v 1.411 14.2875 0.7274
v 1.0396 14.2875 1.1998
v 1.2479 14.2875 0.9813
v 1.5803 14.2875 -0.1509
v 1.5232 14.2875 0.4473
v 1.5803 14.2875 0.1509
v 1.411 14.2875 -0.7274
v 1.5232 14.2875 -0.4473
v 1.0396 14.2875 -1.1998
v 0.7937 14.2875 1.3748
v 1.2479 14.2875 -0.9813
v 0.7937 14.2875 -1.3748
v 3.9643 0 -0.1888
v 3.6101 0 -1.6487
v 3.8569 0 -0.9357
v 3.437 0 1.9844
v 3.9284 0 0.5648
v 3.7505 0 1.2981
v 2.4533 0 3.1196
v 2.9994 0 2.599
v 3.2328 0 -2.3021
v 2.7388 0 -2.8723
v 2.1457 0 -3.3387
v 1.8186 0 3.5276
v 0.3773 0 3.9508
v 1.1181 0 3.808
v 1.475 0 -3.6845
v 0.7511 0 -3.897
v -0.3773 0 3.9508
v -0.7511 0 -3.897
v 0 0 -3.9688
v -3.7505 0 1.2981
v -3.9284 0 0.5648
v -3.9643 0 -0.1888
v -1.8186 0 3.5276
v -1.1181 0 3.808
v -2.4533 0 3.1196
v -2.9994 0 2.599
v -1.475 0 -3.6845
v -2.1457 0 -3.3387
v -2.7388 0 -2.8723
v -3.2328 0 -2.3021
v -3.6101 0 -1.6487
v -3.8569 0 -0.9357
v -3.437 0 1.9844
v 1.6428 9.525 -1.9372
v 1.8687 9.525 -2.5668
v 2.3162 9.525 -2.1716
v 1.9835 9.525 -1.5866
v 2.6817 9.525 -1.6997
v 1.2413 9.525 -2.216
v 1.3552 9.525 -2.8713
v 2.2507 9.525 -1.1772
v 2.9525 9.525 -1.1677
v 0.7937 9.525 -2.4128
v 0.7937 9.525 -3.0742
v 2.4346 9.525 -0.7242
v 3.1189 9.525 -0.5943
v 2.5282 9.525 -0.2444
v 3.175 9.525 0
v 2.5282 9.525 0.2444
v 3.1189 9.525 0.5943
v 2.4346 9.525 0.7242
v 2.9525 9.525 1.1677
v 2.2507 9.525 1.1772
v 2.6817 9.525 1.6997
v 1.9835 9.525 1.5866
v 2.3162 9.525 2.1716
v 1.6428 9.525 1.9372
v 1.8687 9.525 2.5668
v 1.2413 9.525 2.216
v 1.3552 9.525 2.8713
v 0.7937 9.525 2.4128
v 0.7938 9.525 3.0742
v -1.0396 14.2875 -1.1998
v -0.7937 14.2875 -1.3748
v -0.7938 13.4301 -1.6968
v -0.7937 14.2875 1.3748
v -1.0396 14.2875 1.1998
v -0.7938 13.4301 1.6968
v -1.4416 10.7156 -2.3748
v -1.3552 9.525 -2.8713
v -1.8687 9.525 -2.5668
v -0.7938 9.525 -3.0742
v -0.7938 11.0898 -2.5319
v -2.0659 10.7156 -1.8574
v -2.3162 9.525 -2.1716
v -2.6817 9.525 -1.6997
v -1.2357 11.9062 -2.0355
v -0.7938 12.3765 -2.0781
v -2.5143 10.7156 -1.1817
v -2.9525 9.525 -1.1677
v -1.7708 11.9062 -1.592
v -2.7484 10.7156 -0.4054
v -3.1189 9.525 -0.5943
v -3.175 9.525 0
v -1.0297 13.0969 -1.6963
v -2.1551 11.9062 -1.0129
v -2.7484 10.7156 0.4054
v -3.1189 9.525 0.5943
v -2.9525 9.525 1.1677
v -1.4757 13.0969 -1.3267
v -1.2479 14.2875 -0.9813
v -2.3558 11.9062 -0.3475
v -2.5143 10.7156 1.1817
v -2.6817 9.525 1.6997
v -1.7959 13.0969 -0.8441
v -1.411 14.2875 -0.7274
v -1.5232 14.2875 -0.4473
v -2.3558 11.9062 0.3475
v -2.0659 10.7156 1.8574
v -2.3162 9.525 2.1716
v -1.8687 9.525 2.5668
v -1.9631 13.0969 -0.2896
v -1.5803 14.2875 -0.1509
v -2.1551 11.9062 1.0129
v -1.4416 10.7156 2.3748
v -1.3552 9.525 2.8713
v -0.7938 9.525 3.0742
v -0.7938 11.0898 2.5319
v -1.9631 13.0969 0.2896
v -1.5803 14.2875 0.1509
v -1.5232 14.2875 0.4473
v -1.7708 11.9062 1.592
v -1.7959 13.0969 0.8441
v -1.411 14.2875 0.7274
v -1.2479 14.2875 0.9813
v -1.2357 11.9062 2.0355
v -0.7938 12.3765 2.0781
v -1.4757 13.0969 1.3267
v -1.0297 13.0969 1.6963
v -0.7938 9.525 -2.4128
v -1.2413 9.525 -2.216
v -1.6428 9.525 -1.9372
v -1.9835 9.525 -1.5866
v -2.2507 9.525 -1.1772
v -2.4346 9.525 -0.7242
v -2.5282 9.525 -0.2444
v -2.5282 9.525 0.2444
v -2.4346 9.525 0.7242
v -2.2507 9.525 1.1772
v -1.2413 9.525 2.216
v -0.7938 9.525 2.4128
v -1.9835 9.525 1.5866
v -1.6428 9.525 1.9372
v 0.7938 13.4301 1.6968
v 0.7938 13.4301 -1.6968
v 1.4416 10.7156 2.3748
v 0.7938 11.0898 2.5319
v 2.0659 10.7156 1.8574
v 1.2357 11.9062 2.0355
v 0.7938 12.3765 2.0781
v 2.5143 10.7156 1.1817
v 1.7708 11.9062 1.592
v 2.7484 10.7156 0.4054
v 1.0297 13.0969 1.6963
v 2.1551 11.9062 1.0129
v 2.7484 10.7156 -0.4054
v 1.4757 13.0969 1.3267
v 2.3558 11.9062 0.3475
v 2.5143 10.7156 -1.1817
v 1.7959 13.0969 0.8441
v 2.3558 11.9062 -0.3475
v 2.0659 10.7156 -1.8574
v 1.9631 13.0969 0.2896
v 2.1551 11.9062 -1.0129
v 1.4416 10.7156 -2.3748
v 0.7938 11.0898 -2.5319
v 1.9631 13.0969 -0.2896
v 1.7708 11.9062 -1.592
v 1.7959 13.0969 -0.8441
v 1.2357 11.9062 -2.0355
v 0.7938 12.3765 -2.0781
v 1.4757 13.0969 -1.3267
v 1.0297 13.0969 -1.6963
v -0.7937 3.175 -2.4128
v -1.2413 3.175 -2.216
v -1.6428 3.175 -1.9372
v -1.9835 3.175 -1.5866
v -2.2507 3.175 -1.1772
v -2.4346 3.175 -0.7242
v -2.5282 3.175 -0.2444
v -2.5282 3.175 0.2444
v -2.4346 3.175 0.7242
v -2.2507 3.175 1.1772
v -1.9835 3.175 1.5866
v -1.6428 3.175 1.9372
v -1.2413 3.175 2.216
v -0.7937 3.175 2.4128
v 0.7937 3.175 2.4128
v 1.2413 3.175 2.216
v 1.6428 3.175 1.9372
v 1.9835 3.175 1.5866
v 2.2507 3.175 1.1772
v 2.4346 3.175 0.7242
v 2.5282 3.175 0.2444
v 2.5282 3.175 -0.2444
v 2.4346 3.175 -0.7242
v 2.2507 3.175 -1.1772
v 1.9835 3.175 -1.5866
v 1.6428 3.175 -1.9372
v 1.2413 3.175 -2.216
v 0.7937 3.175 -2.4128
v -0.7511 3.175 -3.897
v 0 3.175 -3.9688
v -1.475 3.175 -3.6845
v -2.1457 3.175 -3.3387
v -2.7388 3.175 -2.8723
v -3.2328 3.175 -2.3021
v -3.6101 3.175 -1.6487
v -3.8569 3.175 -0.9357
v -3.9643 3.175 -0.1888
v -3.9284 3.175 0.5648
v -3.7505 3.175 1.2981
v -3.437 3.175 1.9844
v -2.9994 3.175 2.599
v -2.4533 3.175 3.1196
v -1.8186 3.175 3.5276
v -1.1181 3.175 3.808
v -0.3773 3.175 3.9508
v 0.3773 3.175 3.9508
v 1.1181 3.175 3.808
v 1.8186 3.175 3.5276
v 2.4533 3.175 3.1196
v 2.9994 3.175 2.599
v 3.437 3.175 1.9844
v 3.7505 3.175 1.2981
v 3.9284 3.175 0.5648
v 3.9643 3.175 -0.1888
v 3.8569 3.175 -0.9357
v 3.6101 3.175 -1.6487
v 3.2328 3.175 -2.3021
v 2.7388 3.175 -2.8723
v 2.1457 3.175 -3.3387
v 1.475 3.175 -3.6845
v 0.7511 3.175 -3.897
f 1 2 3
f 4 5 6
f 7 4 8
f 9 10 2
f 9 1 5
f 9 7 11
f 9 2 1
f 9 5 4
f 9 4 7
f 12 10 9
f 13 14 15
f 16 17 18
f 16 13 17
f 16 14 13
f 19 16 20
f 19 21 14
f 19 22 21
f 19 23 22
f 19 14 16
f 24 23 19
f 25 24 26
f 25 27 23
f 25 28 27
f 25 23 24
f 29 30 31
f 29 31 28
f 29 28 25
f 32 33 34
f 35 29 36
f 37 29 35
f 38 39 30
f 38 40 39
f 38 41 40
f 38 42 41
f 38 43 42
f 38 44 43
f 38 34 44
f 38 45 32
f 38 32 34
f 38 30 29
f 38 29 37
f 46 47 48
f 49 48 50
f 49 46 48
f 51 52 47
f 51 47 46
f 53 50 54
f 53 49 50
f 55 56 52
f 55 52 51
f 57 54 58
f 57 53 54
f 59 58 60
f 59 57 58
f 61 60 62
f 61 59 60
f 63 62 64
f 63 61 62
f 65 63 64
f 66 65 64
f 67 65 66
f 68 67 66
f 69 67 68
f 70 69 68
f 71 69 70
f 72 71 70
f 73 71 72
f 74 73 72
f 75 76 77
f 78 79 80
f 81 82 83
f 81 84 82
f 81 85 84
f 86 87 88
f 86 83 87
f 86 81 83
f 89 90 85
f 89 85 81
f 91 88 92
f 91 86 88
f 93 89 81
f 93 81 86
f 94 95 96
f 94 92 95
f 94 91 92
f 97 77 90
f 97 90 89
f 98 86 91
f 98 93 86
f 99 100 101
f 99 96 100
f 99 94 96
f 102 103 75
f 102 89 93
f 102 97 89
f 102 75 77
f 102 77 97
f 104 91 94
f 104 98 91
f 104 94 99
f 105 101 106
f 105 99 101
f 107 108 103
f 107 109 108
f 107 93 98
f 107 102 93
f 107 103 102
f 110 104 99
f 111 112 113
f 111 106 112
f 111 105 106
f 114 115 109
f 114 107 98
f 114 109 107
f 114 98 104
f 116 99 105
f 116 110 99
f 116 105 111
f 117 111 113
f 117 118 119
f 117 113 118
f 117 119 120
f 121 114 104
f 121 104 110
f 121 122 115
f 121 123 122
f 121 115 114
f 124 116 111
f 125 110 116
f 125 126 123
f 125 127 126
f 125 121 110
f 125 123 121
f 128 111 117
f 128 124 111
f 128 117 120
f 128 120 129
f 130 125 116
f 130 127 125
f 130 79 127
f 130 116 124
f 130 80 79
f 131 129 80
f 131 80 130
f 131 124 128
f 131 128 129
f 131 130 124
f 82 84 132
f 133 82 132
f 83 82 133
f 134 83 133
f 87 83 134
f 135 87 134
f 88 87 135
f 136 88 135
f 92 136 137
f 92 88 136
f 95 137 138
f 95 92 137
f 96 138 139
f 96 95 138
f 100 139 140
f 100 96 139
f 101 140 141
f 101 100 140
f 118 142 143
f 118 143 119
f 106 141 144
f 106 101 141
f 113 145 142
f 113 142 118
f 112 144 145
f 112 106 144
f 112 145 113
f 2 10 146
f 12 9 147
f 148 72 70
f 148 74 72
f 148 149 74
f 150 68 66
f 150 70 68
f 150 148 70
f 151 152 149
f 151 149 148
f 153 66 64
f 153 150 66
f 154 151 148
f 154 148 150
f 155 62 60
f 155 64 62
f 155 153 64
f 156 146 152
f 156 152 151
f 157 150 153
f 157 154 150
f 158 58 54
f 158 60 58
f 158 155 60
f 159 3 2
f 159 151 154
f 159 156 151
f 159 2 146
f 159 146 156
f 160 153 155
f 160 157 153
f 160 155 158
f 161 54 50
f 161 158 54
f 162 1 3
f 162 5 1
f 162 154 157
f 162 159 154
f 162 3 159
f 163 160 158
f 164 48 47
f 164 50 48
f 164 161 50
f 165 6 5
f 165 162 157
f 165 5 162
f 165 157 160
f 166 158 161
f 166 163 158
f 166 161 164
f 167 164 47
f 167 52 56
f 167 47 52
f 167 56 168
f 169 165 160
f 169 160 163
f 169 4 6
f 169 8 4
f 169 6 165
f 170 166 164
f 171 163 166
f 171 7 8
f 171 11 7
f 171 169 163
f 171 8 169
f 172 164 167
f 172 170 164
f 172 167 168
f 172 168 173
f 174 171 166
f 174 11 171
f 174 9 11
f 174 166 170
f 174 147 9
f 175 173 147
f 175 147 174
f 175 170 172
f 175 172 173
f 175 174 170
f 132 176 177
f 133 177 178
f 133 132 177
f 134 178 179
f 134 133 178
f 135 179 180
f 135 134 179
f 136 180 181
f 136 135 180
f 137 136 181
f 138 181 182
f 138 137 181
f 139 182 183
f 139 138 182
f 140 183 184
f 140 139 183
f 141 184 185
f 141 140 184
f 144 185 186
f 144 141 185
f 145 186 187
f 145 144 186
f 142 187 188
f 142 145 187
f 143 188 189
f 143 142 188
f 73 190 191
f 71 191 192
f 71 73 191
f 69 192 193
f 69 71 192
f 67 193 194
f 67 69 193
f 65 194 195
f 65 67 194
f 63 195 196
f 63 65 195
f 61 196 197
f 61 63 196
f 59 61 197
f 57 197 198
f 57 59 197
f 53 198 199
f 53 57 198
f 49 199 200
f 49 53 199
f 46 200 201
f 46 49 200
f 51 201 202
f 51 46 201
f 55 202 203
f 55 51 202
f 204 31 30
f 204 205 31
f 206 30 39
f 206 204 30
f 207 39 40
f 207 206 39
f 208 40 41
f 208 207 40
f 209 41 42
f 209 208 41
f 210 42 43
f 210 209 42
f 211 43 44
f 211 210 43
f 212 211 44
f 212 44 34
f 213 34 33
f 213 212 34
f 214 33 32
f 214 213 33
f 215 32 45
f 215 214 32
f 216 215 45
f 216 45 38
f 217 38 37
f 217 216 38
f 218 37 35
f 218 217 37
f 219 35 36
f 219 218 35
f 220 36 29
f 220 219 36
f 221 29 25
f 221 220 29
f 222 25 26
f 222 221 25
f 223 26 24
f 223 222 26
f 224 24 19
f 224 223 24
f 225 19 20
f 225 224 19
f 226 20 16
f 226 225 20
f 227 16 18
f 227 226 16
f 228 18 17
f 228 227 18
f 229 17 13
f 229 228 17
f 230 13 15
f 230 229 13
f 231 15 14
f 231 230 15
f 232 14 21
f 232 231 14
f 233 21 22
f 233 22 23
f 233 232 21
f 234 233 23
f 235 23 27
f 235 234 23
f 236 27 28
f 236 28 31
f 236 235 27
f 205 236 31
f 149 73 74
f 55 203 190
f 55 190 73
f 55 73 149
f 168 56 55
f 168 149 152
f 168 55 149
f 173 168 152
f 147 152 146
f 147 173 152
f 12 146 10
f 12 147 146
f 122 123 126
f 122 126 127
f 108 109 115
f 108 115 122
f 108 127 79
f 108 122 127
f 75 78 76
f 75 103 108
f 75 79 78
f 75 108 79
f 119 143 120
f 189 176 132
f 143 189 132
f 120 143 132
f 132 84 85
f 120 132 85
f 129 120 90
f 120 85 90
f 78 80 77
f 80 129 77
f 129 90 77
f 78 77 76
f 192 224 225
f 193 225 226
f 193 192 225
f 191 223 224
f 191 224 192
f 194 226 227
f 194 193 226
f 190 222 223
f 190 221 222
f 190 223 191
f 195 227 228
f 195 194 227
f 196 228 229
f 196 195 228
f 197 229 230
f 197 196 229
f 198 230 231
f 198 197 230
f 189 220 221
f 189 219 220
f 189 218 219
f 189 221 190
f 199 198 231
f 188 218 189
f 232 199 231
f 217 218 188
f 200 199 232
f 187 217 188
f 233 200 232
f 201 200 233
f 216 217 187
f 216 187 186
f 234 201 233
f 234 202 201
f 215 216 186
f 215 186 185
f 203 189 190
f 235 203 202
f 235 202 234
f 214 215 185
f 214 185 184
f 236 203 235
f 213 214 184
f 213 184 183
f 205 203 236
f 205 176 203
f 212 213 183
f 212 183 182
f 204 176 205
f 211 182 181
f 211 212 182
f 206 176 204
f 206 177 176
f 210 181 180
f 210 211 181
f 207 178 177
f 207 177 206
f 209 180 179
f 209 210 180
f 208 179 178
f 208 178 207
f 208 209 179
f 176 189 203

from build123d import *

# Parameters (mm, degrees)
SKETCH1_W               = 2.54
SKETCH1_H               = 6.35
SKETCH2_W               = 1.5875
SKETCH2_H               = 11.1125
CUT_EXTRUDE1_DEPTH      = 4.96875
CUT_EXTRUDE1_DEPTH_BACK = 4.96875


with BuildPart() as part:
    # Sketch1 → Revolve1 (revolve)
    with BuildSketch(Plane(origin=(0, 0, 0), x_dir=(0, 0, -1), z_dir=(1, 0, 0))):
        Polygon((0, 3.175), (0, 0), (3.96875, 0), (3.96875, 3.175), (2.54, 3.175), align=None)
        with Locations((1.27, 6.35)):
            Rectangle(SKETCH1_W, SKETCH1_H)
        Polygon((0, 14.2875), (0, 9.525), (2.54, 9.525), (3.175, 9.525), (1.5875, 14.2875), align=None)
    revolve(axis=Axis((0, 0, 0), (0, 1, 0)))

    # Sketch2 → Cut-Extrude1 (cut, two sides)
    with BuildSketch(Plane.XY) as cut_extrude1_sk:
        with Locations((0, 8.73125)):
            Rectangle(SKETCH2_W, SKETCH2_H)
    extrude(amount=CUT_EXTRUDE1_DEPTH, mode=Mode.SUBTRACT)
    extrude(cut_extrude1_sk.sketch, amount=-CUT_EXTRUDE1_DEPTH_BACK, mode=Mode.SUBTRACT)


solid = part.part
